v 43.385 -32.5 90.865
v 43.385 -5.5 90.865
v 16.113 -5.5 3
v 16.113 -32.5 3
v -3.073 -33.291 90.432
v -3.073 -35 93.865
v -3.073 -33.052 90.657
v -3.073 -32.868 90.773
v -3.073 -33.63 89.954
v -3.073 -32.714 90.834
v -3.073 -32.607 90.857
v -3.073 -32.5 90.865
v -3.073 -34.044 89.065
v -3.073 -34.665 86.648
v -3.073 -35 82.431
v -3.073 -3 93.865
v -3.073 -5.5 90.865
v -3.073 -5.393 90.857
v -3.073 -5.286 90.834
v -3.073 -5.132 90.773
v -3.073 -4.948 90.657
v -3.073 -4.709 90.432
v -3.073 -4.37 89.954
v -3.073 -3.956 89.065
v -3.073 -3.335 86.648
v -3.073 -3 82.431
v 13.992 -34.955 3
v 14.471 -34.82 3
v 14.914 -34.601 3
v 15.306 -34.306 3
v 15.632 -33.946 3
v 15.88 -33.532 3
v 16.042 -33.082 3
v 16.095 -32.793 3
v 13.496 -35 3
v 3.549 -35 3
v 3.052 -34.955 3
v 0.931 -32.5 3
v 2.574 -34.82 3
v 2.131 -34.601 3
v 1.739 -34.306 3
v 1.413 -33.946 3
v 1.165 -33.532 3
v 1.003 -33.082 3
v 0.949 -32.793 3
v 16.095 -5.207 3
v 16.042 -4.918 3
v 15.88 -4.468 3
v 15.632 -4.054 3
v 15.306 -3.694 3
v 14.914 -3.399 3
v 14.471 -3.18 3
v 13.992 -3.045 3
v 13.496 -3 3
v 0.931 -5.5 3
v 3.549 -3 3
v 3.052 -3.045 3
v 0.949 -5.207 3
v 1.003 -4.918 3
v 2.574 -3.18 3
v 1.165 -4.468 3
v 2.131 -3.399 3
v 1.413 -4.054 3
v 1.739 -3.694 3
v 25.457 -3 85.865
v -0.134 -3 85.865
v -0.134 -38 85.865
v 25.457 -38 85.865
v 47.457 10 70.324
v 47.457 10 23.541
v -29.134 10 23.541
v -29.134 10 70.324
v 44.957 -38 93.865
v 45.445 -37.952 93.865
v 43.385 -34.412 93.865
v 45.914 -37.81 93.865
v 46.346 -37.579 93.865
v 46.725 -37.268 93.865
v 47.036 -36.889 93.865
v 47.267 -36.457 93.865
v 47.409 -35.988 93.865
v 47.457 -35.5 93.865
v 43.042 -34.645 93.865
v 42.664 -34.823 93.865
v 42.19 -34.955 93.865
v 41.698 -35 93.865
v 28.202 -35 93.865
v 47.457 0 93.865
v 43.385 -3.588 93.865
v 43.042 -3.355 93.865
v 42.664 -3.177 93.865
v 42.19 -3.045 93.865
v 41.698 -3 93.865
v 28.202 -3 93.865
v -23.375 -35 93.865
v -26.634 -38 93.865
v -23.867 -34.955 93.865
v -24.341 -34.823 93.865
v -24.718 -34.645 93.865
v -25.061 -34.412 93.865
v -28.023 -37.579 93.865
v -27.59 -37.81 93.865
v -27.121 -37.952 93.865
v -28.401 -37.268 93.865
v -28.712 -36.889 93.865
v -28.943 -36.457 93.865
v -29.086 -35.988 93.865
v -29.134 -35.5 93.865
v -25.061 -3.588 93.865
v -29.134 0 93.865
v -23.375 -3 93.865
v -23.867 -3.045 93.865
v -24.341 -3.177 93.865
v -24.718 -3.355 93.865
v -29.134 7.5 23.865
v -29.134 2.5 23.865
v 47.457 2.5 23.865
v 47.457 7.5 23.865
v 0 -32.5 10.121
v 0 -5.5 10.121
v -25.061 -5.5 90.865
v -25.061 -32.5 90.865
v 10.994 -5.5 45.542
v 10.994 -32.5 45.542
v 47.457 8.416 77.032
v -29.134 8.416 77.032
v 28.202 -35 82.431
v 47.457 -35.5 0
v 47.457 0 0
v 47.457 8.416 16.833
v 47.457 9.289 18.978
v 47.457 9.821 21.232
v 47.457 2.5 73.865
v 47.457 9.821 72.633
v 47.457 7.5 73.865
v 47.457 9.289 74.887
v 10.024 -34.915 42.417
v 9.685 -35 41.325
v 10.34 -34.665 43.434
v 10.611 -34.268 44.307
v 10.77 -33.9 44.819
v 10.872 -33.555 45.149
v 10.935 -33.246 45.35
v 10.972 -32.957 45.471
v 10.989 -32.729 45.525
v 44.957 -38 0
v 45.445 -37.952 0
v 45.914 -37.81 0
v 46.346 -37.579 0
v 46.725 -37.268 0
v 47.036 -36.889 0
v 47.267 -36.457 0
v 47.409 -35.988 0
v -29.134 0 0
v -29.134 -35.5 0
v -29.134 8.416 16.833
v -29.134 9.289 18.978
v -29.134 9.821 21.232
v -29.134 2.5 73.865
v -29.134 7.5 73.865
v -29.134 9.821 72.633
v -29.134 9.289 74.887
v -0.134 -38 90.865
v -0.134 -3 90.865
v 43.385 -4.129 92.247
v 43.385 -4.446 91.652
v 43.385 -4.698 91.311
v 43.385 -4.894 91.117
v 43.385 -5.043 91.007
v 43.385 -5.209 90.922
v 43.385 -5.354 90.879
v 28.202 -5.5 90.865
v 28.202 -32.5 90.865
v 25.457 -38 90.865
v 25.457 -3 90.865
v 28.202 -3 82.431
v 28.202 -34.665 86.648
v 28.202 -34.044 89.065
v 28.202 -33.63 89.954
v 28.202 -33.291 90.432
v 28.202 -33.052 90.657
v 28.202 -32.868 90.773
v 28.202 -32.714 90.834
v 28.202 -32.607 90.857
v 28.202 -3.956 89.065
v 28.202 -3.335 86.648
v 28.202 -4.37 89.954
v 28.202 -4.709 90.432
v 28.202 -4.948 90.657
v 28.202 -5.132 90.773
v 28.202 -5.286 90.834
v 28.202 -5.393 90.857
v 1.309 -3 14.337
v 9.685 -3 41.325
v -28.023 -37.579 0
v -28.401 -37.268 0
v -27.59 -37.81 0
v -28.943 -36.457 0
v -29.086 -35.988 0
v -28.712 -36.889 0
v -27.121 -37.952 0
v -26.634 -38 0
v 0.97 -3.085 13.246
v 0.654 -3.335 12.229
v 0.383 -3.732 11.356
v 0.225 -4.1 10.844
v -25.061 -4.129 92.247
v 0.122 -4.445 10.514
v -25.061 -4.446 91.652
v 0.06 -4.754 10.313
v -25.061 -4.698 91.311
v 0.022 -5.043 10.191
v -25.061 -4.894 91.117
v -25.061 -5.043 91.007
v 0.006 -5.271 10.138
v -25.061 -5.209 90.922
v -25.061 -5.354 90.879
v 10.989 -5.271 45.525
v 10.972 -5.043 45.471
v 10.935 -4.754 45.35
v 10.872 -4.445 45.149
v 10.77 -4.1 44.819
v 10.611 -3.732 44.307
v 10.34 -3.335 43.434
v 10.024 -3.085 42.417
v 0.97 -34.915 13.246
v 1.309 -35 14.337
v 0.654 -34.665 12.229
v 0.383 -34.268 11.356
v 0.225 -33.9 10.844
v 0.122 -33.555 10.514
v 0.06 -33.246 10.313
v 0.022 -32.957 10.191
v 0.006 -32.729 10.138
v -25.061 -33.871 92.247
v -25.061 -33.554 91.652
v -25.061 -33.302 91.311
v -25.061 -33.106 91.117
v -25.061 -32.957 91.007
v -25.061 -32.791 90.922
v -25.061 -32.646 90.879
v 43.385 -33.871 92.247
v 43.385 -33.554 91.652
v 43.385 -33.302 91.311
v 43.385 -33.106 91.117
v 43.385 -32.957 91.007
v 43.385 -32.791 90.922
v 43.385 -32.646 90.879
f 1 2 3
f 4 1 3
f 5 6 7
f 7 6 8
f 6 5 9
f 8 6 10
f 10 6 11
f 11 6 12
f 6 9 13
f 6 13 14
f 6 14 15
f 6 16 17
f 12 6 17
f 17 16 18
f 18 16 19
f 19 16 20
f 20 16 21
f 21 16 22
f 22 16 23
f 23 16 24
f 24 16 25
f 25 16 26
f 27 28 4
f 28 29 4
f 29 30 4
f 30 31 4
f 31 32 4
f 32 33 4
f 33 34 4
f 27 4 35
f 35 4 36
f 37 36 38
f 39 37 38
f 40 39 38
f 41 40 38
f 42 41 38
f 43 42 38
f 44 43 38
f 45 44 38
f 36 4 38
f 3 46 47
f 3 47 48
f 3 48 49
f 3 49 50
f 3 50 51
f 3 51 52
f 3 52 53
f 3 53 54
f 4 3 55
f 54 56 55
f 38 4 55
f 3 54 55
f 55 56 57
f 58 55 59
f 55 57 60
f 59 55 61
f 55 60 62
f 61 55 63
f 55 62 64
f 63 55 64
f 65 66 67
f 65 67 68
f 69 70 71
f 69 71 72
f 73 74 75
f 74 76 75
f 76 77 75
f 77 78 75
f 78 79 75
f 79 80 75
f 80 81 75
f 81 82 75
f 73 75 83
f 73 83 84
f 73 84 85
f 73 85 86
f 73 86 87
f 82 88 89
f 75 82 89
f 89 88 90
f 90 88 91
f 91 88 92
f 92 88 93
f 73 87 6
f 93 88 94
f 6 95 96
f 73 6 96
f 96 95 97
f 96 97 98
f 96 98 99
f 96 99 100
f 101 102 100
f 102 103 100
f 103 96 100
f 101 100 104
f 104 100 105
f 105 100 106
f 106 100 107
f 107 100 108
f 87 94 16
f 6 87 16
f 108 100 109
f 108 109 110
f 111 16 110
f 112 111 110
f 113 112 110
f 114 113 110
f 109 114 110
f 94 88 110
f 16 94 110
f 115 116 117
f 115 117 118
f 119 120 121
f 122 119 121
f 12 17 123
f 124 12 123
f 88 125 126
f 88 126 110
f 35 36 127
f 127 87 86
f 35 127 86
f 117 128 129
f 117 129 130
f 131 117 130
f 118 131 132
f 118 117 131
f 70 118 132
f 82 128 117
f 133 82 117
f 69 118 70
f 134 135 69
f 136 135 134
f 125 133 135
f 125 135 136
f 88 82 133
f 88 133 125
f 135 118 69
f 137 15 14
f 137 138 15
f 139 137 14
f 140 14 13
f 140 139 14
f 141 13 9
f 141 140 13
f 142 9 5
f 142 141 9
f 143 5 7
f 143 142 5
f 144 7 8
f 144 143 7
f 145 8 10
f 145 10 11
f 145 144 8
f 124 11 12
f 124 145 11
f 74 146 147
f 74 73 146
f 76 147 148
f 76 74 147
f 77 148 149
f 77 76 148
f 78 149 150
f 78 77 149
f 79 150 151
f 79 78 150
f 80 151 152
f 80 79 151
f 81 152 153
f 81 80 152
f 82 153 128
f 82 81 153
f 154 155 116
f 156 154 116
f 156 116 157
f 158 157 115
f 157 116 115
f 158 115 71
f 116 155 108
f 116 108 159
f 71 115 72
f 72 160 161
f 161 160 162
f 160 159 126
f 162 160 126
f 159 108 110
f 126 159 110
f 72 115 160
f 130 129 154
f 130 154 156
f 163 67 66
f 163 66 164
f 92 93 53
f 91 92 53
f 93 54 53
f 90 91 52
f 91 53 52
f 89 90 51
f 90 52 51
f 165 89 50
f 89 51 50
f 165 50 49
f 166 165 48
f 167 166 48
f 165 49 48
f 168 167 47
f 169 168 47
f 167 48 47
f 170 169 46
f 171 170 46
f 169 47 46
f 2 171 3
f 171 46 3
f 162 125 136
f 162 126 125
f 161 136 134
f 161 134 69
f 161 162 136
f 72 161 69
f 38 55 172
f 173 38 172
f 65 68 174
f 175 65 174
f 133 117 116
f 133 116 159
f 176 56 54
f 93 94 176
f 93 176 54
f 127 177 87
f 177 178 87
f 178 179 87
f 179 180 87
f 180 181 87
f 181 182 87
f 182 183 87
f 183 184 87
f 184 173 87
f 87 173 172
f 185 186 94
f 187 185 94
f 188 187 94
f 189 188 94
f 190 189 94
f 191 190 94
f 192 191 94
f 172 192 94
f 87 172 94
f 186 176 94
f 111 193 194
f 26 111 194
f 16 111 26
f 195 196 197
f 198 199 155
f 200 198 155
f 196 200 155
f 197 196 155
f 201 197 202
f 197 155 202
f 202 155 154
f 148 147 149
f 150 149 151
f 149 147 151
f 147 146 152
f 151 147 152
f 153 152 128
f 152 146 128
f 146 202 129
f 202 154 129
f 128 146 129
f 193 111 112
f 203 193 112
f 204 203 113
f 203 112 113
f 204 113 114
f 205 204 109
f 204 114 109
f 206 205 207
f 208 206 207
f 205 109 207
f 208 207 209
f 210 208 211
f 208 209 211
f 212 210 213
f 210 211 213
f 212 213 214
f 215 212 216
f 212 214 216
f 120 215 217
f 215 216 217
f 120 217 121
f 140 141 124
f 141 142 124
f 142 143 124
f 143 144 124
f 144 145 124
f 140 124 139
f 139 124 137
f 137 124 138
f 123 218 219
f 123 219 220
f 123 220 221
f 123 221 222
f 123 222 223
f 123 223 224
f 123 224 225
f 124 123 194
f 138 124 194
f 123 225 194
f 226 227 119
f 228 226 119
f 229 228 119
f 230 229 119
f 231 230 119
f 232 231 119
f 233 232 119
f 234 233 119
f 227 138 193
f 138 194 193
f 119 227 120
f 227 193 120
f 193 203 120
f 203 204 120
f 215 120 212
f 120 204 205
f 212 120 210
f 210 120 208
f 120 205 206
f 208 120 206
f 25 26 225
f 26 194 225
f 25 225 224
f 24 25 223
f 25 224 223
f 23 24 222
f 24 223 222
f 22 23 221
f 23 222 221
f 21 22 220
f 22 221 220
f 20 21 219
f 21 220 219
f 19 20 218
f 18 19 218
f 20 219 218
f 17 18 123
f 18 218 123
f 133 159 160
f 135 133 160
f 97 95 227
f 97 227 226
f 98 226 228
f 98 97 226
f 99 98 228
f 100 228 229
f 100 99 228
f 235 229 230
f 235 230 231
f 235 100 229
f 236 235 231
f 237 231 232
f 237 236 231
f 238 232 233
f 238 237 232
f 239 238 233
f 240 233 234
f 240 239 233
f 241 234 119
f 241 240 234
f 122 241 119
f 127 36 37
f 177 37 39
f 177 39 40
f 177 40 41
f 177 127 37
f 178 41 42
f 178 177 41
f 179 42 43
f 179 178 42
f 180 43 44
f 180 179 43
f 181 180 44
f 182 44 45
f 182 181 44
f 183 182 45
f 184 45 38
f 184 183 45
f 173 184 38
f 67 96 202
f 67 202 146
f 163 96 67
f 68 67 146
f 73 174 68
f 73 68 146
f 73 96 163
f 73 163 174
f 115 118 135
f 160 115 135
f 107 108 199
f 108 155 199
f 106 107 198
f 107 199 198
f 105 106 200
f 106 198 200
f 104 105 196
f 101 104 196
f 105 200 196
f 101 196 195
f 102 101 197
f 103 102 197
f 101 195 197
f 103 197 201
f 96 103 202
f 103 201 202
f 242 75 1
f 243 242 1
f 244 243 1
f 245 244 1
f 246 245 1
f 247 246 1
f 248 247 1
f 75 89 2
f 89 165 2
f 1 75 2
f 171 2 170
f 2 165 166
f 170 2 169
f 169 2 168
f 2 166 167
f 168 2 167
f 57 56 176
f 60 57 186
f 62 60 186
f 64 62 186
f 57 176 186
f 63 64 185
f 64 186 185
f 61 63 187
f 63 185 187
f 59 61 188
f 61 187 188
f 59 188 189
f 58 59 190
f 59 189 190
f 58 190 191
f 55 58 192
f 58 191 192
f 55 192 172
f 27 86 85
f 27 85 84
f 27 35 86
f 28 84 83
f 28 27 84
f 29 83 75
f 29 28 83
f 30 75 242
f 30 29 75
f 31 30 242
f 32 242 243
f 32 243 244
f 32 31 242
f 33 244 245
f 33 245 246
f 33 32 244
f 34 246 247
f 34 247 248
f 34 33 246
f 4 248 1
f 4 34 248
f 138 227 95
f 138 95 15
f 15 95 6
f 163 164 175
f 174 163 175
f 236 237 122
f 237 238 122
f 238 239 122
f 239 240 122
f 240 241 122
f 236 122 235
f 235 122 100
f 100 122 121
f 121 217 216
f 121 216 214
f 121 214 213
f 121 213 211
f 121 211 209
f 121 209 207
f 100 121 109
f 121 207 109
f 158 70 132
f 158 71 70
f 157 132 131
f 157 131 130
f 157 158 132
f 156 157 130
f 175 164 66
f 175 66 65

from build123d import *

# Parameters (mm, degrees)
F1_DEPTH  = 3
F2_START  = 3
F2_DEPTH  = 32
F3_START  = 35
F3_DEPTH  = 3
F4_W      = 5
F4_H      = 50
F5_DEPTH  = 76.5907008807
F6_R      = 15
F8_R      = 2.5
F9_R      = 2.5
F7_W      = 25.5907008807
F7_H      = 5
F10_DEPTH = 35


with BuildPart() as f1:
    # F0 (on Front) → F1 (new body)
    with BuildSketch(Plane.XZ):
        Polygon((-29.1335783188, 93.8650974194), (0, 0), (18.3235442432, 0), (47.457122562, 93.8650974194), (43.384812198, 93.8650974194), (43.384812198, 90.8650974194), (16.1134965809, 3), (0.9311313508, 3), (28.2024469679, 90.8650974194), (28.2024469679, 93.8650974194), (-3.0730148629, 93.8650974194), (-3.0730148629, 90.8650974194), (10.9941265459, 45.5423573046), (0, 10.1205238455), (-25.0612679548, 90.8650974194), (-25.0612679548, 93.8650974194), align=None)
        Polygon((-3.0730148629, 93.8650974194), (-25.0612679548, 93.8650974194), (-25.0612679548, 90.8650974194), (0, 10.1205238455), (10.9941265459, 45.5423573046), (-3.0730148629, 90.8650974194), align=None)
        Polygon((43.384812198, 90.8650974194), (43.384812198, 93.8650974194), (28.2024469679, 93.8650974194), (28.2024469679, 90.8650974194), (0.9311313508, 3), (16.1134965809, 3), align=None)
        Polygon((-29.1335783188, 0), (0, 0), (-29.1335783188, 93.8650974194), align=None)
        Polygon((47.457122562, 93.8650974194), (18.3235442432, 0), (47.457122562, 0), align=None)
    extrude(amount=F1_DEPTH)

    # F0 (on Front) → F2 (join)
    with BuildSketch(Plane.XZ.offset(F2_START)):
        Polygon((-29.1335783188, 93.8650974194), (0, 0), (18.3235442432, 0), (47.457122562, 93.8650974194), (43.384812198, 93.8650974194), (43.384812198, 90.8650974194), (16.1134965809, 3), (0.9311313508, 3), (28.2024469679, 90.8650974194), (28.2024469679, 93.8650974194), (-3.0730148629, 93.8650974194), (-3.0730148629, 90.8650974194), (10.9941265459, 45.5423573046), (0, 10.1205238455), (-25.0612679548, 90.8650974194), (-25.0612679548, 93.8650974194), align=None)
        Polygon((-29.1335783188, 0), (0, 0), (-29.1335783188, 93.8650974194), align=None)
        Polygon((47.457122562, 93.8650974194), (18.3235442432, 0), (47.457122562, 0), align=None)
    extrude(amount=F2_DEPTH)

    # F0 (on Front) → F3 (join)
    with BuildSketch(Plane.XZ.offset(F3_START)):
        Polygon((-29.1335783188, 93.8650974194), (0, 0), (18.3235442432, 0), (47.457122562, 93.8650974194), (43.384812198, 93.8650974194), (43.384812198, 90.8650974194), (16.1134965809, 3), (0.9311313508, 3), (28.2024469679, 90.8650974194), (28.2024469679, 93.8650974194), (-3.0730148629, 93.8650974194), (-3.0730148629, 90.8650974194), (10.9941265459, 45.5423573046), (0, 10.1205238455), (-25.0612679548, 90.8650974194), (-25.0612679548, 93.8650974194), align=None)
        Polygon((-3.0730148629, 93.8650974194), (-25.0612679548, 93.8650974194), (-25.0612679548, 90.8650974194), (0, 10.1205238455), (10.9941265459, 45.5423573046), (-3.0730148629, 90.8650974194), align=None)
        Polygon((43.384812198, 90.8650974194), (43.384812198, 93.8650974194), (28.2024469679, 93.8650974194), (28.2024469679, 90.8650974194), (0.9311313508, 3), (16.1134965809, 3), align=None)
        Polygon((-29.1335783188, 0), (0, 0), (-29.1335783188, 93.8650974194), align=None)
        Polygon((47.457122562, 93.8650974194), (18.3235442432, 0), (47.457122562, 0), align=None)
    extrude(amount=F3_DEPTH)

    # F4 (on face) → F5 (join, through all)
    with BuildSketch(Plane.YZ.offset(47.457122562)):
        Polygon((10, 73.8650974194), (0, 93.8650974194), (0, 0), (10, 20), align=None)
        with Locations((5, 48.8650974194)):
            Rectangle(F4_W, F4_H, mode=Mode.SUBTRACT)
    extrude(amount=-F5_DEPTH)

    # F6
    f6_edges = [f1.edges().sort_by_distance(p)[0] for p in [
        (9.161772, 10, 73.865097),
        (9.161772, 10, 20),
    ]]
    fillet(f6_edges, radius=F6_R)

    # F8
    f8_edges = [f1.edges().sort_by_distance(p)[0] for p in [
        (-12.530634, -3, 50.492811),
        (3.960556, -3, 68.203727),
        (3.960556, -35, 68.203727),
        (-12.530634, -35, 50.492811),
        (29.749154, -35, 46.932549),
        (29.749154, -3, 46.932549),
        (14.566789, -3, 46.932549),
        (14.566789, -35, 46.932549),
    ]]
    fillet(f8_edges, radius=F8_R)

    # F9
    f9_edges = [f1.edges().sort_by_distance(p)[0] for p in [
        (-29.133578, -38, 46.932549),
        (47.457123, -38, 46.932549),
    ]]
    fillet(f9_edges, radius=F9_R)

    # F7 (on face) → F10 (cut)
    with BuildSketch(Plane.XZ.offset(38)):
        with Locations((12.6617721216, 88.3650974194)):
            Rectangle(F7_W, F7_H)
    extrude(amount=-F10_DEPTH, mode=Mode.SUBTRACT)


solid = f1.part
